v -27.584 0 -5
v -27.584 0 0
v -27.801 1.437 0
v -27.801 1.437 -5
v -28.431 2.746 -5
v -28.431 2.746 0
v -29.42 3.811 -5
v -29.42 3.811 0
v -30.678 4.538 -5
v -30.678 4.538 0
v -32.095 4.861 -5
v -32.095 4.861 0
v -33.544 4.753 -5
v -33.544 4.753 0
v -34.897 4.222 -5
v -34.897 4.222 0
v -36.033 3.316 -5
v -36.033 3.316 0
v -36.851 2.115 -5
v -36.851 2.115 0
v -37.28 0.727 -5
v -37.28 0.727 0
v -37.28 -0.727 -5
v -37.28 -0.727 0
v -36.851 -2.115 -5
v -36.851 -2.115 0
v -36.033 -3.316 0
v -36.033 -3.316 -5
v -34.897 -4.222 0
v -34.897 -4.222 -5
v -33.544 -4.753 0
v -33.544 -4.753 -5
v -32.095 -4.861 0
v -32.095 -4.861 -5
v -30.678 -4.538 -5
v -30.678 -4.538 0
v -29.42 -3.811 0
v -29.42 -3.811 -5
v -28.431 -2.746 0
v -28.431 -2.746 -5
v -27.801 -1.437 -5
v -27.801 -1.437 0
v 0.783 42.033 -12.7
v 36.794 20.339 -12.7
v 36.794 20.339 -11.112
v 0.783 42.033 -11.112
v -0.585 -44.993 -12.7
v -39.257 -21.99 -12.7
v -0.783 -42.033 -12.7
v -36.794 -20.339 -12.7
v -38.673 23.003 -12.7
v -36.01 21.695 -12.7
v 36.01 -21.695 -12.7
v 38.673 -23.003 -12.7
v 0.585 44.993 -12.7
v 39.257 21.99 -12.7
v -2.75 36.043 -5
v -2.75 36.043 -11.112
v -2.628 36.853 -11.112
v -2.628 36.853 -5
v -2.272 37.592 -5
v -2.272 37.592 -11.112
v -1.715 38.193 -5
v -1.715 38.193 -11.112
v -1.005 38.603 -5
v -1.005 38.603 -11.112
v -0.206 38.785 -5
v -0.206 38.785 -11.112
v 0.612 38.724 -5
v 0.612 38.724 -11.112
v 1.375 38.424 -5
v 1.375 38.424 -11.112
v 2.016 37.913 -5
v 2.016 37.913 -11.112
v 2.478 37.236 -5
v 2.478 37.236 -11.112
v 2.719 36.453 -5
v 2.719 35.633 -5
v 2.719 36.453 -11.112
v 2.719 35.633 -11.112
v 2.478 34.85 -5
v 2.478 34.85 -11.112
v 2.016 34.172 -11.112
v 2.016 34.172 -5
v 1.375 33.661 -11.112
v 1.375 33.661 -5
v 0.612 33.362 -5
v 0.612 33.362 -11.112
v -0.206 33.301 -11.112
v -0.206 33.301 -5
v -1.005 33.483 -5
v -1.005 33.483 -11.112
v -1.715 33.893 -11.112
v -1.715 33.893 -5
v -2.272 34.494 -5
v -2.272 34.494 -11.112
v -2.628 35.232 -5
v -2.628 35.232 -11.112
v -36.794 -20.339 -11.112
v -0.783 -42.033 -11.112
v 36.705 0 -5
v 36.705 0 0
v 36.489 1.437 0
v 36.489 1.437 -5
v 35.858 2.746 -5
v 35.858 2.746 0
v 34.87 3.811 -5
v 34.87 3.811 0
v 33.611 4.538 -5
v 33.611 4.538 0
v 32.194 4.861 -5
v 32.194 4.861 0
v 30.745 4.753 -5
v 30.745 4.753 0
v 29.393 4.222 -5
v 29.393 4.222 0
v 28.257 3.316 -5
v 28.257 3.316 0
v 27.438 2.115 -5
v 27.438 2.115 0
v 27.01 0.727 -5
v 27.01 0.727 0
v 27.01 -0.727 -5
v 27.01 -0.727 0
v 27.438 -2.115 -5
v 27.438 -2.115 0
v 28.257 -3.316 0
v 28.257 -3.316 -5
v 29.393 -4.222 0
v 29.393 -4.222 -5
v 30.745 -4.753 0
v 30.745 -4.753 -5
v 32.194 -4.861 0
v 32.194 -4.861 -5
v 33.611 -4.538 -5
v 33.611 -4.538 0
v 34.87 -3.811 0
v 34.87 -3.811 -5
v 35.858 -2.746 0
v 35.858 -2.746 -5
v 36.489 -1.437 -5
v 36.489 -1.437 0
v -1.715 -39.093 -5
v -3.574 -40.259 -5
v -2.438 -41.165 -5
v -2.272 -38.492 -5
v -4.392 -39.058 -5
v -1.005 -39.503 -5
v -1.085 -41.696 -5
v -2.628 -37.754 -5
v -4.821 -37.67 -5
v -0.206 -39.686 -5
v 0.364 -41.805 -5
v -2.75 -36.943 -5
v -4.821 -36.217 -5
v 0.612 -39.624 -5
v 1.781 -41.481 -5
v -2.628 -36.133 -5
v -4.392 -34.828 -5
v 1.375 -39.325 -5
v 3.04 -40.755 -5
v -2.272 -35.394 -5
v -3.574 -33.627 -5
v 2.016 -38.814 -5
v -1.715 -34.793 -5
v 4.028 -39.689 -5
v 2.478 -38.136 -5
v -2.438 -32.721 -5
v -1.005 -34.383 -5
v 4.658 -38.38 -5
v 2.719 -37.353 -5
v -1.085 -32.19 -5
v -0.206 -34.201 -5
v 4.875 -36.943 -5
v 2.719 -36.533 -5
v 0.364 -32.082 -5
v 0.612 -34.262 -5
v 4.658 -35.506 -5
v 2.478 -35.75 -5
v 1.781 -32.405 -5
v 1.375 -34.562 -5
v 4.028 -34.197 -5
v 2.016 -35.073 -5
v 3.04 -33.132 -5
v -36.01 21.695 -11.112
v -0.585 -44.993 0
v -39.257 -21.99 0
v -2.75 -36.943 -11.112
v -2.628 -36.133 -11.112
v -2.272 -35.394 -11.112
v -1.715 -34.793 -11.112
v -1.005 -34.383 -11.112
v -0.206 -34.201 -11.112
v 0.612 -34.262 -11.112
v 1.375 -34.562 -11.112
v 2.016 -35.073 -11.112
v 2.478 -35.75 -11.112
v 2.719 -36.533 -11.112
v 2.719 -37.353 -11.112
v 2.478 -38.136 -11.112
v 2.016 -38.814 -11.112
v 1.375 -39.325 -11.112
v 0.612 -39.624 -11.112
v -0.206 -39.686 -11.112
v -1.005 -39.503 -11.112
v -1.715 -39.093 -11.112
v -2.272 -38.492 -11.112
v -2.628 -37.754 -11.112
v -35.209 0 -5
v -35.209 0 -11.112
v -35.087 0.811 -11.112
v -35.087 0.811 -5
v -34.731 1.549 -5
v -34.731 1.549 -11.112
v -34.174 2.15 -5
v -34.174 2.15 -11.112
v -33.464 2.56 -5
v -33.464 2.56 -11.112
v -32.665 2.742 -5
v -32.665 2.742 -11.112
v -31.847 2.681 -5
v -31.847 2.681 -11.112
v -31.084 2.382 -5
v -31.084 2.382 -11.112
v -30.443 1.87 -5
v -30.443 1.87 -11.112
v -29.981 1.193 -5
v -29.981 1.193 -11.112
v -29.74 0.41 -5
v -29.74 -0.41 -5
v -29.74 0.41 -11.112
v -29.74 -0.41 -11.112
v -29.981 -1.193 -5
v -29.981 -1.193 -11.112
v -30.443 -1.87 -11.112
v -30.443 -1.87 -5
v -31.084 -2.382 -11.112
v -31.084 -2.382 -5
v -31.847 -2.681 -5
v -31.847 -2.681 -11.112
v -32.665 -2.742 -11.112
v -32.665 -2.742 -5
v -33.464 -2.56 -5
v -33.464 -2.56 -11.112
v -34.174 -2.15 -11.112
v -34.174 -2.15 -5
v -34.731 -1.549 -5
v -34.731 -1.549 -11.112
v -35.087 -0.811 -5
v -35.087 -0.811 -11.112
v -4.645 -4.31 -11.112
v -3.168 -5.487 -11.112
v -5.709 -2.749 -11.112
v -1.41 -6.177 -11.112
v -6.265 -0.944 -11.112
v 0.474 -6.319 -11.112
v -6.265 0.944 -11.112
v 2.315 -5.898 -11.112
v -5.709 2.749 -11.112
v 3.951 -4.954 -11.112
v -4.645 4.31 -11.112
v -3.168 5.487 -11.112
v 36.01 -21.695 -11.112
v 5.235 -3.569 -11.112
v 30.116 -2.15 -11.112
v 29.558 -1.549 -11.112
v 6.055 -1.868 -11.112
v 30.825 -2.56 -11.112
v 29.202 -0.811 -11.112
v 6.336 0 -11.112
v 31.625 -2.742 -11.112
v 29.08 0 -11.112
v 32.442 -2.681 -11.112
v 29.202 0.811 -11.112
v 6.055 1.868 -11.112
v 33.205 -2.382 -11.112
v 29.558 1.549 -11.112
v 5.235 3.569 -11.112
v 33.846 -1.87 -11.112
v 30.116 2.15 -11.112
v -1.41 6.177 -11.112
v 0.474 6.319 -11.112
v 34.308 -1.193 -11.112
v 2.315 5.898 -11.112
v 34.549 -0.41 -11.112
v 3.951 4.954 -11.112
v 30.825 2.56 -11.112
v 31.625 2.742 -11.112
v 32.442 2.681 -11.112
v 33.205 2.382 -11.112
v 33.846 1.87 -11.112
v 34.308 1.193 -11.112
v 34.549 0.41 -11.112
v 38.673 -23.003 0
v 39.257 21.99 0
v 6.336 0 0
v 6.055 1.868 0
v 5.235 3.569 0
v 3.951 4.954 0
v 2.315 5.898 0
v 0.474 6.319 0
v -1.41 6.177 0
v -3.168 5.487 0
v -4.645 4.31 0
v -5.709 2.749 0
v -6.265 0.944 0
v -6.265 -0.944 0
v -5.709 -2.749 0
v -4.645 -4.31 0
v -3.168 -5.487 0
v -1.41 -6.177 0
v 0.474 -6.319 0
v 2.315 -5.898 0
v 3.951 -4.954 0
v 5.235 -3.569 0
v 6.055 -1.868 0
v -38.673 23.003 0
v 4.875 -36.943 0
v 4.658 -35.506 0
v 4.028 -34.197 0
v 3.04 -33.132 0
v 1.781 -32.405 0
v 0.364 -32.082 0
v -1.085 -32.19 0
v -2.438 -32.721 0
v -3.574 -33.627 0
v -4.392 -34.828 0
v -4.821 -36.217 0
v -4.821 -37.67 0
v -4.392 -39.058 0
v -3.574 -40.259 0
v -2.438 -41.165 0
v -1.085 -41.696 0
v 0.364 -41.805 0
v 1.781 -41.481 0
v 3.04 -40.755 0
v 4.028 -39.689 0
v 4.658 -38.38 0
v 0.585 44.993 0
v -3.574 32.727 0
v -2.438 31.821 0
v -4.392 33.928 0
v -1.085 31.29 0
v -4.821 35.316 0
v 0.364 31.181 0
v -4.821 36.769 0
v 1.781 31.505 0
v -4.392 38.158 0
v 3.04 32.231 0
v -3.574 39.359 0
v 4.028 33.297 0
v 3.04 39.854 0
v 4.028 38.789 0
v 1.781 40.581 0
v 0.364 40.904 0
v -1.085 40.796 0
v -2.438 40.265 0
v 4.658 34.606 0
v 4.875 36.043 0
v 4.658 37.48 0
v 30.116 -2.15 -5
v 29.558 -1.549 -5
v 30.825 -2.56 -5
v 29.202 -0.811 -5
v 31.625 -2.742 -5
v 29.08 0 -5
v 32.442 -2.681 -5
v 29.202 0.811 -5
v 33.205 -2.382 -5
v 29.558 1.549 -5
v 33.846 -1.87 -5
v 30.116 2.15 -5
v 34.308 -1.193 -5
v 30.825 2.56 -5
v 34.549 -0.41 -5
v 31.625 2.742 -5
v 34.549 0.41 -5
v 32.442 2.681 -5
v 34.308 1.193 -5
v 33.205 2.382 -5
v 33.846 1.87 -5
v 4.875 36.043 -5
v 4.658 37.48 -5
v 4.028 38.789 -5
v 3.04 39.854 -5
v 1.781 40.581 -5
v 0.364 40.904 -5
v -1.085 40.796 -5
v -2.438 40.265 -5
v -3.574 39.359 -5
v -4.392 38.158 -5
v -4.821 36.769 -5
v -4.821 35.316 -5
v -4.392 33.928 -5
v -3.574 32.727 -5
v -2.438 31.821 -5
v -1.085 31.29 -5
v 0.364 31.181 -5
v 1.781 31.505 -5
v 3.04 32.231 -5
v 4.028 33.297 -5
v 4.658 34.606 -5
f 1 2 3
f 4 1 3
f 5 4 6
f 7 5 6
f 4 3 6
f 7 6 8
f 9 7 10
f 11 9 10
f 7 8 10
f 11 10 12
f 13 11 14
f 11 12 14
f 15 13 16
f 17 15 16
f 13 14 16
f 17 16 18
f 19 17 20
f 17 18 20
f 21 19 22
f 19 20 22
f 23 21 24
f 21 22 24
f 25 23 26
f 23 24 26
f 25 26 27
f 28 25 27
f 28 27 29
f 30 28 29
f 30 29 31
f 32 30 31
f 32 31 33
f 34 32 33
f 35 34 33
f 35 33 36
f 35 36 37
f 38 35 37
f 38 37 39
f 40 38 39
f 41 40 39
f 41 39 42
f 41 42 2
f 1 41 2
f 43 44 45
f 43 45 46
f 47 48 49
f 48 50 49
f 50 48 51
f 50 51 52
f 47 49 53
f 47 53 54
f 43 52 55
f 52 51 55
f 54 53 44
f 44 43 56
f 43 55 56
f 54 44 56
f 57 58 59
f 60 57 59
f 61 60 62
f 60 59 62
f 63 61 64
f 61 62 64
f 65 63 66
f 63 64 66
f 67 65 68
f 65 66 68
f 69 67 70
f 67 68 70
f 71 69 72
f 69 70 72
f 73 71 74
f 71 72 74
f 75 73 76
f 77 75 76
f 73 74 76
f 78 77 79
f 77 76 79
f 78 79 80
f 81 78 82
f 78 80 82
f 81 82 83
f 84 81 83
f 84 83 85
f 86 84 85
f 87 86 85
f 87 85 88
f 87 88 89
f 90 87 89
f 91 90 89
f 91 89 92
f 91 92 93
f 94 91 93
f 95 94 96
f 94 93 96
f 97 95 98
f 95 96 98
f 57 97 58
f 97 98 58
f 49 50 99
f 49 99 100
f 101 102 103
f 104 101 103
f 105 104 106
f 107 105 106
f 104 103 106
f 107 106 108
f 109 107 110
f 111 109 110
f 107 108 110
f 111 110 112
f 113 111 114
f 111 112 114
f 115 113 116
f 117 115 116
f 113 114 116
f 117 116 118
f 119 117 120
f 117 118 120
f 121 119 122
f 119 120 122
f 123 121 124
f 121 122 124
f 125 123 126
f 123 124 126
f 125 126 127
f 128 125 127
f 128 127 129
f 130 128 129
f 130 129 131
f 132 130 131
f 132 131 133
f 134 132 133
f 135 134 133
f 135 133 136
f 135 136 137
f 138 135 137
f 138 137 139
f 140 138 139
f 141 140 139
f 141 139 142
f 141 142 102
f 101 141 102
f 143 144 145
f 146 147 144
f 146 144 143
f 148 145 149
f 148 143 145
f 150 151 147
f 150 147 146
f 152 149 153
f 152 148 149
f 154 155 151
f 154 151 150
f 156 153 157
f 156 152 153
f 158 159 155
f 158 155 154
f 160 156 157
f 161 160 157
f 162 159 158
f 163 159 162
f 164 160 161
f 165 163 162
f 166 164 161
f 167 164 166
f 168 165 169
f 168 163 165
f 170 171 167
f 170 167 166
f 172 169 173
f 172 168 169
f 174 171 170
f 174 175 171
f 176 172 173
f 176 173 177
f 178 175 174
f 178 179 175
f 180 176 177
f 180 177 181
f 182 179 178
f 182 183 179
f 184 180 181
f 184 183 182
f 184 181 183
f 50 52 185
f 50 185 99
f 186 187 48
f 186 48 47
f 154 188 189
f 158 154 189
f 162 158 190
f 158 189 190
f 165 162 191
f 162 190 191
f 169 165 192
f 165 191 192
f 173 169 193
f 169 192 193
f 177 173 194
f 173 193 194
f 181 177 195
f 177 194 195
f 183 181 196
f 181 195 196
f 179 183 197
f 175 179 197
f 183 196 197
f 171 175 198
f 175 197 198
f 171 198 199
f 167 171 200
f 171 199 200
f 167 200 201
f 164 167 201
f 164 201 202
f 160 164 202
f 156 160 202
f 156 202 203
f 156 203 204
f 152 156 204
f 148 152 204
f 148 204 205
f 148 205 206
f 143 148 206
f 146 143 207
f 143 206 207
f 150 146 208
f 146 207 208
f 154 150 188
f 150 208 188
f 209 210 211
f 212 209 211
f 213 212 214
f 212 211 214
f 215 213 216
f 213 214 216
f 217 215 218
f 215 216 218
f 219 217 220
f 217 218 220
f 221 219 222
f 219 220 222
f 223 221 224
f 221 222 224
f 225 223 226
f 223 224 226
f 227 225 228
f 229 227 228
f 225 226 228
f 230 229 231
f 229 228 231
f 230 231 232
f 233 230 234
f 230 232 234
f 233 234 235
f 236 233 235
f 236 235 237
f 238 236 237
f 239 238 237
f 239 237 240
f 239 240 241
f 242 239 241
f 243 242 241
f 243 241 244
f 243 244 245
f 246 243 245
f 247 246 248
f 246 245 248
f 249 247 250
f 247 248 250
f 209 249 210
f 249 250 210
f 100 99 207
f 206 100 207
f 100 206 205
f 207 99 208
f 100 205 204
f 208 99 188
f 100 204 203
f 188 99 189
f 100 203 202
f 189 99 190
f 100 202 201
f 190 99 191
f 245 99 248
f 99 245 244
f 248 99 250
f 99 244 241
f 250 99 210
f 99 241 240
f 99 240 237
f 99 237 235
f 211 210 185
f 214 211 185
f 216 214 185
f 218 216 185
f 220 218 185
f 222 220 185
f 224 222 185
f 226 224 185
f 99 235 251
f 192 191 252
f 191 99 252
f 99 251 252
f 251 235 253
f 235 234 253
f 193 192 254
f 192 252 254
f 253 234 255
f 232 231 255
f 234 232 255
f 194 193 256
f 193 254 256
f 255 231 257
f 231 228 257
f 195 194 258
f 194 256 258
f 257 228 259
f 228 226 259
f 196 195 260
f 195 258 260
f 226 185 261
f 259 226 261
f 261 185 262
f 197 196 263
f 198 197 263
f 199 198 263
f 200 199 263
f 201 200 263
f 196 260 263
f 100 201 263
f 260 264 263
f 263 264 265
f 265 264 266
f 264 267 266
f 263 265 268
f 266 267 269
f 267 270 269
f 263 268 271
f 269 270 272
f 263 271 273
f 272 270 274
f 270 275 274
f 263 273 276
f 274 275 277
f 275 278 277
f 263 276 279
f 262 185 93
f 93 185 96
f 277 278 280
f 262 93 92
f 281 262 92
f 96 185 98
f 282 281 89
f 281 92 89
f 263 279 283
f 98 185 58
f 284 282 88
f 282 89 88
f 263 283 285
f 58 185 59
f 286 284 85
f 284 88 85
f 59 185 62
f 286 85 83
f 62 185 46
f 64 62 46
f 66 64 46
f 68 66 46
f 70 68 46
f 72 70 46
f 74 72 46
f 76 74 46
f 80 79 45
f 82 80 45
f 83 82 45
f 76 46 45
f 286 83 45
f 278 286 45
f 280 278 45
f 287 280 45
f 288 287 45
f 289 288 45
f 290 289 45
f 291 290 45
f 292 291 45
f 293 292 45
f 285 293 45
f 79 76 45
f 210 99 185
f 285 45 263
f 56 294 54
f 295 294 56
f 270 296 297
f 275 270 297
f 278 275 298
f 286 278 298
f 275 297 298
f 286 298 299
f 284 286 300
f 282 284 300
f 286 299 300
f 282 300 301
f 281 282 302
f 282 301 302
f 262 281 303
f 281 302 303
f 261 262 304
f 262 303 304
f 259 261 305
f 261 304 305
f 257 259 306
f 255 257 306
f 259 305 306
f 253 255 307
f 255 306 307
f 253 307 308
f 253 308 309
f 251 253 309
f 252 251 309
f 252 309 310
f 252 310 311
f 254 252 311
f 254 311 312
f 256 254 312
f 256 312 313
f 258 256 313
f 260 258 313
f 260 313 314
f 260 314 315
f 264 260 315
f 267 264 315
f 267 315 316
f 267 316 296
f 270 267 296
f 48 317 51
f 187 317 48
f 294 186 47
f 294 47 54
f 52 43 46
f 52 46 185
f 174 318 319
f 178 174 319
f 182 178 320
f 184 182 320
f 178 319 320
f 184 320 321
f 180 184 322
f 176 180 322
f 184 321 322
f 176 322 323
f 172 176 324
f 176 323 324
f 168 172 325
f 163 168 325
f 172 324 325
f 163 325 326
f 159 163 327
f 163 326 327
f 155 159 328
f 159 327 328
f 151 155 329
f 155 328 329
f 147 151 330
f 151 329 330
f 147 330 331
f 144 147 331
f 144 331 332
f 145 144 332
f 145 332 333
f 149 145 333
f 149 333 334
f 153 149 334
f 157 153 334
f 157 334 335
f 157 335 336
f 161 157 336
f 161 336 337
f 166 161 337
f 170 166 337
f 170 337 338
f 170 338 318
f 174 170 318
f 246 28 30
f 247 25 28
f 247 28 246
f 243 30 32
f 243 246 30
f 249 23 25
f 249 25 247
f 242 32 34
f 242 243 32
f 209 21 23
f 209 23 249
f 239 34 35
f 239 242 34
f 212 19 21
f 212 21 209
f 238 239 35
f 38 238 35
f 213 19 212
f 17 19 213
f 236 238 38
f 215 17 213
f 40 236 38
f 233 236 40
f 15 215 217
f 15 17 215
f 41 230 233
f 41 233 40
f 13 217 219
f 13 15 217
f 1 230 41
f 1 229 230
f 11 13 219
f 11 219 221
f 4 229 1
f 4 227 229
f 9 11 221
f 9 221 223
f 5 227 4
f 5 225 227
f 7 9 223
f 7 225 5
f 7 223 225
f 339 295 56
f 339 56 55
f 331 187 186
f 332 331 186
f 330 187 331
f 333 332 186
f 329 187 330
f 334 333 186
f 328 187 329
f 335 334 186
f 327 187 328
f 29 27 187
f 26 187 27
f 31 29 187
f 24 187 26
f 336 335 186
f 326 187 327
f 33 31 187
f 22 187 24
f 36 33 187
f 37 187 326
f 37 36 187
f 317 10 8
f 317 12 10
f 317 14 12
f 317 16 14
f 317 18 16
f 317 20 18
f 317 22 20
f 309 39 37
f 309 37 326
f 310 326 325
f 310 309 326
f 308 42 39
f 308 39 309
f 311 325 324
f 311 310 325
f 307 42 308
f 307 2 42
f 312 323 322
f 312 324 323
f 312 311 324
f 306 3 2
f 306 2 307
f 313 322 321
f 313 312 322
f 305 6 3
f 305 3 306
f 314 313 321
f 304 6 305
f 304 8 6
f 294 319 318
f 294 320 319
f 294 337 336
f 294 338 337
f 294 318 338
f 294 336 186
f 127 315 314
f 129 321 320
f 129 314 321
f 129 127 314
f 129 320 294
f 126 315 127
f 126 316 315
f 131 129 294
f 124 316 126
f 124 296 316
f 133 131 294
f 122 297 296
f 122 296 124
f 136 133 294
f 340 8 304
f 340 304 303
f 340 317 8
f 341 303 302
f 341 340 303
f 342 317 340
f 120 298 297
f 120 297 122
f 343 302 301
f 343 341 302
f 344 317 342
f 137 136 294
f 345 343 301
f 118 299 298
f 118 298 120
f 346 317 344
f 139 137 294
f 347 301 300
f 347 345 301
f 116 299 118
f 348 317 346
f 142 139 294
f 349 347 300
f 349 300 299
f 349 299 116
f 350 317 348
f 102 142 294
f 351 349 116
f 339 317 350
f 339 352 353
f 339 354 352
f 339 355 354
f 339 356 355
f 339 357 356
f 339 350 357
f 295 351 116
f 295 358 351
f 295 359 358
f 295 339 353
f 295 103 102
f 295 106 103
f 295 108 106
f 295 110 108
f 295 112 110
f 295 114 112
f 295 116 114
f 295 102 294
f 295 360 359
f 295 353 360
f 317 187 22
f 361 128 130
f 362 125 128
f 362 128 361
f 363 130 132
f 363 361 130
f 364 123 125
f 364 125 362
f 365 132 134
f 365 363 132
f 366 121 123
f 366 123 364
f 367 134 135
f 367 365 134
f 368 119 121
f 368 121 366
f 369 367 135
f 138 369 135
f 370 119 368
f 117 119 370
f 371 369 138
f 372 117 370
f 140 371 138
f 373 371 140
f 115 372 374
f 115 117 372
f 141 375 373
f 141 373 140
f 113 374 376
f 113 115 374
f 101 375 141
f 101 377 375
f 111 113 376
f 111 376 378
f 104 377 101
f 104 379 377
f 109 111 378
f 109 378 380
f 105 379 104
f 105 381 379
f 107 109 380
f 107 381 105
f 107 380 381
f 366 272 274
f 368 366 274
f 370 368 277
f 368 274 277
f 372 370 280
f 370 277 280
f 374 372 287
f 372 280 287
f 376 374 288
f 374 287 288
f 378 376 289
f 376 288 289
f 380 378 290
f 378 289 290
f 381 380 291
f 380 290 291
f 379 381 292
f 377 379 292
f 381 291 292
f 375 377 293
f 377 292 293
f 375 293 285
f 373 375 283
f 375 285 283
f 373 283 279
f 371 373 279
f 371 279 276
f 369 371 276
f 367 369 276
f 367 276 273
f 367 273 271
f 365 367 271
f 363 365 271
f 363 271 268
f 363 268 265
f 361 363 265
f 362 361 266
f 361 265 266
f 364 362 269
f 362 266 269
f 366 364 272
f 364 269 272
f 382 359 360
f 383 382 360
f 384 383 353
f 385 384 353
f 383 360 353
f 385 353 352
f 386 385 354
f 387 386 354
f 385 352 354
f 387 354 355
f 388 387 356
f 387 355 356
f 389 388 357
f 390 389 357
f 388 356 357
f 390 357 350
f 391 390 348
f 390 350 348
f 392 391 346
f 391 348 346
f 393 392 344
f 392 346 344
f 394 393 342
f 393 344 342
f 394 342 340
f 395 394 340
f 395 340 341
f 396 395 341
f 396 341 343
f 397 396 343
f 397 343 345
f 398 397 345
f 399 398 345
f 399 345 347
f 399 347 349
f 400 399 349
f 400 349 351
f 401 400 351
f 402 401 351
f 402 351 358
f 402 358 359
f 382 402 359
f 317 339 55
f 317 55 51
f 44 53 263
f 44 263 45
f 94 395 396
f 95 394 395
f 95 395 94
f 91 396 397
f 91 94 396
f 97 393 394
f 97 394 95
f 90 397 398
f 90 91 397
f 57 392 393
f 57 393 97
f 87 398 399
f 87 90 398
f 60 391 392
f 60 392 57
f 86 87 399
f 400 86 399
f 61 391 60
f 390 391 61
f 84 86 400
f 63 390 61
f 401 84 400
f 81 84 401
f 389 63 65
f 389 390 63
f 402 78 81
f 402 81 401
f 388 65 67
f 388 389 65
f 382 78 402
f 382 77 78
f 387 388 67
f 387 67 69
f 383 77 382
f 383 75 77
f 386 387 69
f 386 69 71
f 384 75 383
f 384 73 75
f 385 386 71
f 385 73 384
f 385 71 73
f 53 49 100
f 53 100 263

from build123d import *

# Parameters (mm, degrees)
F1_DEPTH       = 12.7
F3_D           = 5.5
F3_CBORE_D     = 9.75
F3_CBORE_DEPTH = 5
F4_R           = 6.336218
F5_DEPTH       = 25.4
F8_DEPTH       = 1.5875


with BuildPart() as f1:
    # F0 (on Top) → F1 (new body)
    with BuildSketch(Plane.XY):
        Polygon((-0.584762, -44.992867), (38.672585, -23.002853), (39.257347, 21.990015), (0.584762, 44.992867), (-38.672585, 23.002853), (-39.257347, -21.990015), align=None)
    extrude(amount=-F1_DEPTH)

    # F3 (through all)
    with Locations(Plane.XY):
        with Locations((0, -36.943253), (31.830151, 0), (0, 36.042843), (-32.459036, 0)):
            CounterBoreHole(F3_D / 2, F3_CBORE_D / 2, F3_CBORE_DEPTH)

    # F4 (on Top) → F5 (cut)
    with BuildSketch(Plane.XY):
        Circle(F4_R)
    extrude(amount=-F5_DEPTH, mode=Mode.SUBTRACT)

    # F7 (on offset) → F8 (cut)
    with BuildSketch(Plane.XY.offset(-12.7)):
        Polygon((36.793541, 20.338582), (0.783042, 42.033432), (-36.010499, 21.69485), (-36.793541, -20.338582), (-0.783042, -42.033432), (36.010499, -21.69485), align=None)
    extrude(amount=F8_DEPTH, mode=Mode.SUBTRACT)


solid = f1.part
